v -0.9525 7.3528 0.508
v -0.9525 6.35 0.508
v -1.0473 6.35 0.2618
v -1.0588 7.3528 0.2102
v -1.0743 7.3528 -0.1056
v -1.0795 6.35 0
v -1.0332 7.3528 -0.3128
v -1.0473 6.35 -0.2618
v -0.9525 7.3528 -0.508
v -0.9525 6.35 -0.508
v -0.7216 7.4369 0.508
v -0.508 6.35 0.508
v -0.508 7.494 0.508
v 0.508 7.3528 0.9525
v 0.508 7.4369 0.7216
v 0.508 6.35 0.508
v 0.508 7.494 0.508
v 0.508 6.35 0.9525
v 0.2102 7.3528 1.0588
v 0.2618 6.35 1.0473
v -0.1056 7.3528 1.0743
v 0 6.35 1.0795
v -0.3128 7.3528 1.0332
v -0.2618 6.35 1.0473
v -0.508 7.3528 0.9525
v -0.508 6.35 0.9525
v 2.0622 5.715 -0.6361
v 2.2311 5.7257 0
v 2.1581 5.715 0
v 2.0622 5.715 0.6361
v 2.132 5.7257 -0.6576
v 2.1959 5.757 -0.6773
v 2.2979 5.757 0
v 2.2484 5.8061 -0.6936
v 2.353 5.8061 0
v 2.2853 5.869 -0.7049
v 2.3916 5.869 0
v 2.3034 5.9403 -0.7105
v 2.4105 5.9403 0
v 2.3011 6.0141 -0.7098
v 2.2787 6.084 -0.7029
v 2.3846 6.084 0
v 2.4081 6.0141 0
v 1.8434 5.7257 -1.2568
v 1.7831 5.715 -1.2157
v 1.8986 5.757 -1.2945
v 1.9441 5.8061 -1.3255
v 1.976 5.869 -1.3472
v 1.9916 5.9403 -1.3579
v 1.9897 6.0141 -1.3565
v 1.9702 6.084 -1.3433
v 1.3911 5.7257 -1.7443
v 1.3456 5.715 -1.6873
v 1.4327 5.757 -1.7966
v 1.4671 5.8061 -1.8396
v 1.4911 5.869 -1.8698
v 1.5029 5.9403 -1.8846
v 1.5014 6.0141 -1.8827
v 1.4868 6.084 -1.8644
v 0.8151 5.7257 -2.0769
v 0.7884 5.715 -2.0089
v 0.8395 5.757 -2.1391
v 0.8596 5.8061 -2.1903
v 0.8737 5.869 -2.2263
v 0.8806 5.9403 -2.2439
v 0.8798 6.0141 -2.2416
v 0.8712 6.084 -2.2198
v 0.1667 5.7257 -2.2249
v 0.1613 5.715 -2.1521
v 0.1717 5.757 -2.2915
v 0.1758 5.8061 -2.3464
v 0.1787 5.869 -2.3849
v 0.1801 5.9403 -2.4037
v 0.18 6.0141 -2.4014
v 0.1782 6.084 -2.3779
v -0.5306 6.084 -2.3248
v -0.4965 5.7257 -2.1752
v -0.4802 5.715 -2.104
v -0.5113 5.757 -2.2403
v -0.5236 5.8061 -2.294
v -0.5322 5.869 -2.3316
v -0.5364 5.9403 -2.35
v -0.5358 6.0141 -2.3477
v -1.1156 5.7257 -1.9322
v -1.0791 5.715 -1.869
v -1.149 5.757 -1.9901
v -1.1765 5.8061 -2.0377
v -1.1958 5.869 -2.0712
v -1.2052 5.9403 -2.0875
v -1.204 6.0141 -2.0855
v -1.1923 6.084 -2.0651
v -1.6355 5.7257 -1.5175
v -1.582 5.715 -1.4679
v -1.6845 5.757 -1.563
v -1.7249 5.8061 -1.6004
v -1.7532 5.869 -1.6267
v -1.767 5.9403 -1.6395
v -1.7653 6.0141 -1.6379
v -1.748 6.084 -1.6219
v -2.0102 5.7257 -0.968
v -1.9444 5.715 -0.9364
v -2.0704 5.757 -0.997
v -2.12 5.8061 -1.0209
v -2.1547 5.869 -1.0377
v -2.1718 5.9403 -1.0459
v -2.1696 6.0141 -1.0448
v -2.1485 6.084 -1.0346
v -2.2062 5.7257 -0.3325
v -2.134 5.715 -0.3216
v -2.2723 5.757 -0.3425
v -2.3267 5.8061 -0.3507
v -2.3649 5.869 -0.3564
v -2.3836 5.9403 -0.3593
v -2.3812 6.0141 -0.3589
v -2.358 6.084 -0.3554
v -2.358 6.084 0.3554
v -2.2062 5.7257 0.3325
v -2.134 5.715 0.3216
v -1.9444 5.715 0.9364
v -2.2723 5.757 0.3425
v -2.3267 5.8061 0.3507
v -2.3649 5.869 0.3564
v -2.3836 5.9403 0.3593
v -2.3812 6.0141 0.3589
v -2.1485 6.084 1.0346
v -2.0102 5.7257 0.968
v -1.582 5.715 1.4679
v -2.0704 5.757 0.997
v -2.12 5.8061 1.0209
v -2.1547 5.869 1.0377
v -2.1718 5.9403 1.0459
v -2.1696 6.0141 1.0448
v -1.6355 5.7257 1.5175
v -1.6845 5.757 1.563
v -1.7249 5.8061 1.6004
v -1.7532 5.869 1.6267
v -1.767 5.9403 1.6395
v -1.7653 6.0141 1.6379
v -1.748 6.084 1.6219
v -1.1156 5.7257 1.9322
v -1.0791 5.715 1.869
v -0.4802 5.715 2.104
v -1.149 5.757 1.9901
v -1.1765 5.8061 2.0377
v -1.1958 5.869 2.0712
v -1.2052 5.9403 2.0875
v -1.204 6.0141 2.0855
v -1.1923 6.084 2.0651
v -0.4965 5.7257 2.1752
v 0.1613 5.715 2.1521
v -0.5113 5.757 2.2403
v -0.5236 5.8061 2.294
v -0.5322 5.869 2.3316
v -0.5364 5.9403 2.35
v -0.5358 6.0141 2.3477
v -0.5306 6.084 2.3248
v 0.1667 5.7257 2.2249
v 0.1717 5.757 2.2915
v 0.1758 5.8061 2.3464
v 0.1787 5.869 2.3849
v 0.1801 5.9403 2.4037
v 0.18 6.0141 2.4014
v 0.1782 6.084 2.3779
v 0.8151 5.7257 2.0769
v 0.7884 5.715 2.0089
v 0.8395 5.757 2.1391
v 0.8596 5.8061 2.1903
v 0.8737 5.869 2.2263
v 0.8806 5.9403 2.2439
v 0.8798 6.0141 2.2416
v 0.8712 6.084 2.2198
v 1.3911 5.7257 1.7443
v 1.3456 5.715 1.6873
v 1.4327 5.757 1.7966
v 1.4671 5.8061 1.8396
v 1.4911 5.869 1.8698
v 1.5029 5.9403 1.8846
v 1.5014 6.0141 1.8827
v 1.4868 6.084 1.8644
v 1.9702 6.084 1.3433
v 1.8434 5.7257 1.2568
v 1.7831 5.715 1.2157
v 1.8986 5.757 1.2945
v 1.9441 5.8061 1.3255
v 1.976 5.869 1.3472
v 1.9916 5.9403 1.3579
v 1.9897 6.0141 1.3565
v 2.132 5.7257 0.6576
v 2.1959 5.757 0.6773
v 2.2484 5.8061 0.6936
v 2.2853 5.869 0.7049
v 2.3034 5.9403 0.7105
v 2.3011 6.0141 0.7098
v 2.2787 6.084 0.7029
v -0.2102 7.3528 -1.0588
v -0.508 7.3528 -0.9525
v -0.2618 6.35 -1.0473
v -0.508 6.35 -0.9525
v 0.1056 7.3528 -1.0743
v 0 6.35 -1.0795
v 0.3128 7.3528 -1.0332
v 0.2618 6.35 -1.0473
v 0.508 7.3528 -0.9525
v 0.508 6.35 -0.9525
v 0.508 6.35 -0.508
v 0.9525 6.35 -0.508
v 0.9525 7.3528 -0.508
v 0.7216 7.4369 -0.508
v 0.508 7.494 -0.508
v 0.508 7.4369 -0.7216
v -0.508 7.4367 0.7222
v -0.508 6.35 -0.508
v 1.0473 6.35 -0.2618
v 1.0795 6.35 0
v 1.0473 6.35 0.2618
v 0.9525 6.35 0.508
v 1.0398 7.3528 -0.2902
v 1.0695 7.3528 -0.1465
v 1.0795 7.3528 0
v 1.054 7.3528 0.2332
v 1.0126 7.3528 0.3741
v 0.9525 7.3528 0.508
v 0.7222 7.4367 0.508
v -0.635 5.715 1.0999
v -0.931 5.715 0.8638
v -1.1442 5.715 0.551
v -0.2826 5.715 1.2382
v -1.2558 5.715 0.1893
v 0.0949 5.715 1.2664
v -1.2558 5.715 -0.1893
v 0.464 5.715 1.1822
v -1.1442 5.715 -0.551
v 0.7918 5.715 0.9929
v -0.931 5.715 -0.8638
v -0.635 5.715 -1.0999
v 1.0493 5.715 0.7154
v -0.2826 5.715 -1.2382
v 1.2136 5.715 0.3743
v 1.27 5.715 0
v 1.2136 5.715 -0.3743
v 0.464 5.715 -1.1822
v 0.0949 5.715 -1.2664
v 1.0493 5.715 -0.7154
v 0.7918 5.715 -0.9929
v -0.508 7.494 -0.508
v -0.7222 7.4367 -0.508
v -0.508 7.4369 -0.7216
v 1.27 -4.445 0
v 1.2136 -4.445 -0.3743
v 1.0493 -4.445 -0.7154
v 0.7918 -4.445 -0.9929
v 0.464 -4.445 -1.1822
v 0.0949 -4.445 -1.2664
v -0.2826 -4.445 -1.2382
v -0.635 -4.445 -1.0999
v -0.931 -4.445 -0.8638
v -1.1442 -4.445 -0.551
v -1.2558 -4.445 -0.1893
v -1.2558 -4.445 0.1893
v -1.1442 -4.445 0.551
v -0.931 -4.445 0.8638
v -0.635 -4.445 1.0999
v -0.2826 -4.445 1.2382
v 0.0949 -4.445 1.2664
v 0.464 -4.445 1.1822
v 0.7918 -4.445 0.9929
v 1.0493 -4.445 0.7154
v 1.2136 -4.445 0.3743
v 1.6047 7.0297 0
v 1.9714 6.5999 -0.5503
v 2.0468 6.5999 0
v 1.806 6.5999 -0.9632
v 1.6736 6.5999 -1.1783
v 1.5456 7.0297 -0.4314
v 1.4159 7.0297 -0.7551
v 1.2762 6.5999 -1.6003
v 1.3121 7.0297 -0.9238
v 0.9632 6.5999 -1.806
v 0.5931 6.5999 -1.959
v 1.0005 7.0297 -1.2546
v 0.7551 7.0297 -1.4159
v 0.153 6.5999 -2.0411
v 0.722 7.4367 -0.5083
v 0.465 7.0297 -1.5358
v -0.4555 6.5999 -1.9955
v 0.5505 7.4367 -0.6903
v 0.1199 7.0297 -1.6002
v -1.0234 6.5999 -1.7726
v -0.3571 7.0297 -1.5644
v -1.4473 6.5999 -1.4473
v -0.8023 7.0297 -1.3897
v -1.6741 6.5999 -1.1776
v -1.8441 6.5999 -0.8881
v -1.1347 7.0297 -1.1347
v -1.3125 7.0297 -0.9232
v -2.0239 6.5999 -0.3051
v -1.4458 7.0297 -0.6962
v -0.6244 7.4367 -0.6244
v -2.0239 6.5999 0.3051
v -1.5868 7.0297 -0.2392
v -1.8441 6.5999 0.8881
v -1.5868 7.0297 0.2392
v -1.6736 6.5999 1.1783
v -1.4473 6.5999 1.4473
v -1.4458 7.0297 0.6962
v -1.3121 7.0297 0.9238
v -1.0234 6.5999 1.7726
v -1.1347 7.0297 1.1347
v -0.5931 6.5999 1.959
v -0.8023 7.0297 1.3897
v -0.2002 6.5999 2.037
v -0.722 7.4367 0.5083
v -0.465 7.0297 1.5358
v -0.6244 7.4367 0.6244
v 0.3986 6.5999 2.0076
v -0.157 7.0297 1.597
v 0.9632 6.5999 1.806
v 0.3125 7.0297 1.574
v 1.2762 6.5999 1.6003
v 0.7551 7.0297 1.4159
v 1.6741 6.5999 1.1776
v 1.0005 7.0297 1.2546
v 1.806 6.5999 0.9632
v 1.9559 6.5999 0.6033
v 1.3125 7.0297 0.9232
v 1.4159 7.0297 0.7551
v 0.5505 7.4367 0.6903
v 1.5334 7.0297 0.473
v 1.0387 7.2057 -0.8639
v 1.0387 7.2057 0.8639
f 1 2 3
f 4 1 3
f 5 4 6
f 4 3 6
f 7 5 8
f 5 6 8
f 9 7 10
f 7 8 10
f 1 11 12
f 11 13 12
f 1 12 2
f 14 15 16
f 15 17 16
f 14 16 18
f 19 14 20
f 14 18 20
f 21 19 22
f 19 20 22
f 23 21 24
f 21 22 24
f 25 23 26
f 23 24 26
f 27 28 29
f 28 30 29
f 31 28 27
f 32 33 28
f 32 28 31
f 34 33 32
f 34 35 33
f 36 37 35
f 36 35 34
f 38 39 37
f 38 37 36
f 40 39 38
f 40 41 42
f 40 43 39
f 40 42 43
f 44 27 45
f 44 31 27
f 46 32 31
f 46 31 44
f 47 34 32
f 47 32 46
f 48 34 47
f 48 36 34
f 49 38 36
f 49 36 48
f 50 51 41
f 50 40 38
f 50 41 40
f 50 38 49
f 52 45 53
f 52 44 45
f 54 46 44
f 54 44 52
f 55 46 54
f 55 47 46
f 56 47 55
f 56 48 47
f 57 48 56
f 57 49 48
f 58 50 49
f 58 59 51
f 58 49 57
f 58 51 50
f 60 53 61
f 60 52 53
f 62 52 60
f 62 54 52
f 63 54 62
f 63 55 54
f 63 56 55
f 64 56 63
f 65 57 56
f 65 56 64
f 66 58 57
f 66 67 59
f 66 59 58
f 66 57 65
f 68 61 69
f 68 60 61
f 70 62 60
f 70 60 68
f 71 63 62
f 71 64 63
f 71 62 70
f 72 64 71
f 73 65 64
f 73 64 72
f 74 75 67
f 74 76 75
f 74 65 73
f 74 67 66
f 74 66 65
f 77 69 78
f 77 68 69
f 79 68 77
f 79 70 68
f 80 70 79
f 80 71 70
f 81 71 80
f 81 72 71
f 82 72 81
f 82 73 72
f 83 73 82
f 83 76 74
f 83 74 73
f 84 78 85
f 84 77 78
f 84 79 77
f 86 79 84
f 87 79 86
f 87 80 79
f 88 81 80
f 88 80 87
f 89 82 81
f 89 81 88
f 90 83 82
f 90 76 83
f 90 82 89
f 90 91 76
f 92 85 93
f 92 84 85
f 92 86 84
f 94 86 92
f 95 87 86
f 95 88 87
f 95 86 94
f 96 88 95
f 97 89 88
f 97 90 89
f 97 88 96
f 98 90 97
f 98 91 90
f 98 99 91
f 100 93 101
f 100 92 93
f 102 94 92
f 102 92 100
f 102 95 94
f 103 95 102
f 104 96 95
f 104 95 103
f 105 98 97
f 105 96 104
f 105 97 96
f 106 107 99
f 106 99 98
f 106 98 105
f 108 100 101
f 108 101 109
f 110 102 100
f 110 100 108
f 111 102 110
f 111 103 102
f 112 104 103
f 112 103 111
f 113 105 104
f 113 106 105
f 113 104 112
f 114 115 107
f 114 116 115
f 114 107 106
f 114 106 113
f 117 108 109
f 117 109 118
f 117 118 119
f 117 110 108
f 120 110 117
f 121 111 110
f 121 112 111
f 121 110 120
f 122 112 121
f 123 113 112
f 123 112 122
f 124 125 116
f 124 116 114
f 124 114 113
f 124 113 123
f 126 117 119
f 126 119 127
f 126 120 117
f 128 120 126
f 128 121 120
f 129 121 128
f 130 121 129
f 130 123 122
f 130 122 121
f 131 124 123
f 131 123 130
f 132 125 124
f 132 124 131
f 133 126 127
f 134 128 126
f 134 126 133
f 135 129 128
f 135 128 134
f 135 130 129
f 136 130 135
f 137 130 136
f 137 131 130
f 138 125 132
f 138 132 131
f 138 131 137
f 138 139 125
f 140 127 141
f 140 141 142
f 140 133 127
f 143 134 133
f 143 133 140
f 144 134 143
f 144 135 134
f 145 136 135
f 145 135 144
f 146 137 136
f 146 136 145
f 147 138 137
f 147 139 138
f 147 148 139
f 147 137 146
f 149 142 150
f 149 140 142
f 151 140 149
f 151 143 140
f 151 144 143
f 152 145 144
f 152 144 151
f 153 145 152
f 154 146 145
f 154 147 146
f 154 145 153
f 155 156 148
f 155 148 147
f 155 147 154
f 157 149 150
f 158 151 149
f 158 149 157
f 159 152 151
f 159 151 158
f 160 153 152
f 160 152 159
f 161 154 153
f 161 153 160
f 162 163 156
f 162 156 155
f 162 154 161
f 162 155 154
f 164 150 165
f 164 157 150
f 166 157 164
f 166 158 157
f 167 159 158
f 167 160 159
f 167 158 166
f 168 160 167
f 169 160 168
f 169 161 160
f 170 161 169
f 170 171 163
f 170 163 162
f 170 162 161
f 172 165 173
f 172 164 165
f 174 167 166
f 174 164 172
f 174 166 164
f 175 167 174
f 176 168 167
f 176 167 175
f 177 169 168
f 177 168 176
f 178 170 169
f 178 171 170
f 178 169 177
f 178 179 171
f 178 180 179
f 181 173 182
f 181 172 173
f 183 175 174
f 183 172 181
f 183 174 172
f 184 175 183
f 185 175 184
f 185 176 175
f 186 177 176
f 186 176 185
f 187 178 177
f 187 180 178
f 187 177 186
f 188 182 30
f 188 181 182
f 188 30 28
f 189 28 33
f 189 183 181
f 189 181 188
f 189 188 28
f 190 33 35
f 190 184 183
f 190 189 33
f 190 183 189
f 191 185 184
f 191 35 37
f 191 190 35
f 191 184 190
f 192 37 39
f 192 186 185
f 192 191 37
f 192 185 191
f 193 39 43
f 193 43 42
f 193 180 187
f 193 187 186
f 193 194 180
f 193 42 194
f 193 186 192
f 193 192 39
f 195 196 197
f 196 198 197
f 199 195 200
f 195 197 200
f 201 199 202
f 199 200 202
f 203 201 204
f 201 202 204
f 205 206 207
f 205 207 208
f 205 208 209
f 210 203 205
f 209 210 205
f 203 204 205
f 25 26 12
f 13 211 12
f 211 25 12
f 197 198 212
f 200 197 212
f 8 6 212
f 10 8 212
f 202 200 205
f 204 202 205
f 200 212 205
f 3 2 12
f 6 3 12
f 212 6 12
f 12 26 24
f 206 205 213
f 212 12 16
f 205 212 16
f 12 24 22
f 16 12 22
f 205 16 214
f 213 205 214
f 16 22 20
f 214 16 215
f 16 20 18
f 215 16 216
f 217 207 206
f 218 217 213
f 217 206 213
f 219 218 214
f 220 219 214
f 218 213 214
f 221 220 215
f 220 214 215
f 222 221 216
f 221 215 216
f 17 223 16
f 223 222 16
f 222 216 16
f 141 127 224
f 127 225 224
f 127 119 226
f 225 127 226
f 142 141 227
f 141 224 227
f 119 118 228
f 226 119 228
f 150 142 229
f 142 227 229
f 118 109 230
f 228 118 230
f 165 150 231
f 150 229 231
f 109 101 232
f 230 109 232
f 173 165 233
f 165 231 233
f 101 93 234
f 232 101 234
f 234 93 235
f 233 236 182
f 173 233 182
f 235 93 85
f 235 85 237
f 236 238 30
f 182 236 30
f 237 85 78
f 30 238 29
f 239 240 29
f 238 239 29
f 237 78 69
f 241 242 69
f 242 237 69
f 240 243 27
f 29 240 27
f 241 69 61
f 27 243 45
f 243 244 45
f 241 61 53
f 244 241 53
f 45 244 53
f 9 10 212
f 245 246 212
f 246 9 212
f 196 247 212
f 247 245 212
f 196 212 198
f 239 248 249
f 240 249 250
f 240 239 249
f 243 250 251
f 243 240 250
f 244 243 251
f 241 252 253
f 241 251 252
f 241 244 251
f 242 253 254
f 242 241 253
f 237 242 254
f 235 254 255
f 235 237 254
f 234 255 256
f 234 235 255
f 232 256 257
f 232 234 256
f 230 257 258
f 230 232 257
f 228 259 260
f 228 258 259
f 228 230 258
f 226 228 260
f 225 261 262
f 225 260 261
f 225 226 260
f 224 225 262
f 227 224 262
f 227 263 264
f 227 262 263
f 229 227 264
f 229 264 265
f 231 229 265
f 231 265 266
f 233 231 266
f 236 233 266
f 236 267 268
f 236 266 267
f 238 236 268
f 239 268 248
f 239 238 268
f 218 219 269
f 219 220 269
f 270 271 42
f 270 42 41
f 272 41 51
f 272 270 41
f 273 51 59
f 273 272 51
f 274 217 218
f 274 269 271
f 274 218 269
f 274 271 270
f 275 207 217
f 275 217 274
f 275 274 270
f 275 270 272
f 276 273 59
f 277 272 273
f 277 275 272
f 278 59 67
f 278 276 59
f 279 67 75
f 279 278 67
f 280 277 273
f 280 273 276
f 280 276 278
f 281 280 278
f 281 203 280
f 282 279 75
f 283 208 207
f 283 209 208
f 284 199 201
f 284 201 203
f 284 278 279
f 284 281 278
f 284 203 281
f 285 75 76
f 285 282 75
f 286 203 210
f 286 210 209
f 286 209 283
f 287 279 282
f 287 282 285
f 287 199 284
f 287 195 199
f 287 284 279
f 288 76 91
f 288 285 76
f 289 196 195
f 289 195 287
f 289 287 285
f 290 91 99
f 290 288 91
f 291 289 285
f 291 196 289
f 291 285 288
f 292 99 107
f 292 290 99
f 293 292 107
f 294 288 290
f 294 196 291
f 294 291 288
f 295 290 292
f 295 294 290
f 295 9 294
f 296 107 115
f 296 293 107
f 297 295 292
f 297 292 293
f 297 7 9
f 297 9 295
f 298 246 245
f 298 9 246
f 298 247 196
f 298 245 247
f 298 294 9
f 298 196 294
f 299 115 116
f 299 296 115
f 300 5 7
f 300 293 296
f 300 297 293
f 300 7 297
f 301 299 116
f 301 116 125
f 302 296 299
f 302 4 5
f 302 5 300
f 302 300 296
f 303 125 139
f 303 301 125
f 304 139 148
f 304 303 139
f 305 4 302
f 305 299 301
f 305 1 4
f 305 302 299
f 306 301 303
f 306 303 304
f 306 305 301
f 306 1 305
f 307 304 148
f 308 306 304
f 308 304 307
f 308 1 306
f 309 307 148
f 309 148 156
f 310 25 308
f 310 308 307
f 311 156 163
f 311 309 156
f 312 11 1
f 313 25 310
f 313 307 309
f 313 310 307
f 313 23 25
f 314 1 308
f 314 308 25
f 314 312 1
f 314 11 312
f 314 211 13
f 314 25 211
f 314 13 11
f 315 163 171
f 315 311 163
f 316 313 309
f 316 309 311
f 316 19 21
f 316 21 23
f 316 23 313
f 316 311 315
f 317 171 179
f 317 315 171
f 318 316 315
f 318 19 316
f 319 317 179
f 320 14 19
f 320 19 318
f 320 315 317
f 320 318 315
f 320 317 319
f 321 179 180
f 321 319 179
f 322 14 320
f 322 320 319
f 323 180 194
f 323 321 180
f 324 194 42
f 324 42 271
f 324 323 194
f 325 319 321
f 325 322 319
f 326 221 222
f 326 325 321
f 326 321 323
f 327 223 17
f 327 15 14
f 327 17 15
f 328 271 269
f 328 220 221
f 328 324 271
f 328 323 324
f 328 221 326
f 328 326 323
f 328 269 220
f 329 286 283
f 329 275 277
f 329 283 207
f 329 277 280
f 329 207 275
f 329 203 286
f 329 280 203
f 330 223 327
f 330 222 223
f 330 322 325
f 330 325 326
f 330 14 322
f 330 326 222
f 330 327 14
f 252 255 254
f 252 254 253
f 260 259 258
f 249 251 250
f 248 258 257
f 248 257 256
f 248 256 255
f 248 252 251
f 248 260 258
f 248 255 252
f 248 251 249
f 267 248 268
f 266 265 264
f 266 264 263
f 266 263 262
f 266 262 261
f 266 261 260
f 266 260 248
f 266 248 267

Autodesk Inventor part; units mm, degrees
ref_plane "YZ Plane" through (0, 0, 0) normal (1, 0, 0) x (0, 1, 0)
ref_plane "XZ Plane" through (0, 0, 0) normal (0, 1, 0) x (-1, 0, 0)
ref_plane "XY Plane" through (0, 0, 0) normal (0, 0, 1) x (1, 0, 0)
sketch "Sketch1" plane through (0, 0, 0) normal (0, 0, 1) x (1, 0, 0)
  line L0 (2.1581, 5.715) -> (1.27, 5.715)
  line L1 (1.27, 5.715) -> (1.27, 0)
  line L2 (1.27, 0) -> (0, 0)
  line L3 (0, 0) -> (0, 7.62)
  arc A0 (2.3846, 6.084) -> (0, 7.62) centre (-0.1226, 4.8107) ccw
  arc A1 (2.1581, 5.715) -> (2.3846, 6.084) centre (2.1581, 5.969) ccw
  point P0 (2.54, 5.715)
  dimension "d0" = 7.62
  dimension "d1" = 2.54
  dimension "d2" = 1.905
  dimension "d3" = 1.27
  dimension "d4" = 0.254
revolve "Revolution1" add sketch "Sketch1" angle 360 about axis through (0, 0, 0) along (0, 1, 0)
sketch "Sketch2" plane through (0, 0, 0) normal (0, -1, 0) x (1, 0, 0)
  circle A0 centre (0, 0) radius 1.27 projected
  line L0 (0.9525, 0.508) -> (0.508, 0.508)
  line L1 (0.508, 0.508) -> (0.508, 0.9525)
  line L2 (-0.508, 0.9525) -> (-0.508, 0.508)
  line L3 (-0.508, 0.508) -> (-0.9525, 0.508)
  line L4 (-0.9525, -0.508) -> (-0.508, -0.508)
  line L5 (-0.508, -0.508) -> (-0.508, -0.9525)
  line L6 (0.508, -0.9525) -> (0.508, -0.508)
  line L7 (0.9525, -0.508) -> (0.508, -0.508)
  arc A1 (0.9525, -0.508) -> (0.9525, 0.508) centre (0, 0) ccw
  arc A2 (-0.508, -0.9525) -> (0.508, -0.9525) centre (0, 0) ccw
  arc A3 (0.508, 0.9525) -> (-0.508, 0.9525) centre (0, 0) ccw
  arc A4 (-0.9525, 0.508) -> (-0.9525, -0.508) centre (0, 0) ccw
  point P0 (1.164, -0.508)
  point P1 (1.164, 0.508)
  point P2 (-1.164, -0.508)
  point P3 (-1.164, 0.508)
  point P4 (0.508, -1.164)
  point P5 (-0.508, -1.164)
  point P6 (-0.508, 1.164)
  point P7 (0.508, 1.164)
  dimension "d6" = 0.508
  dimension "d7" = 0.508
extrude "Extrusion1" cut sketch "Sketch2" against normal blind 25.4 contours A1 L7 L6 A2 L5 L4 A4 L3 L2 A3 L1 L0
sketch "Sketch3" plane through (0, 0, 0) normal (0, -1, 0) x (1, 0, 0)
  circle A0 centre (0, 0) radius 1.27
extrude "Extrusion2" add sketch "Sketch3" against normal blind 6.35
sketch "Sketch4" plane through (0, 0, 0) normal (0, -1, 0) x (1, 0, 0)
  circle A0 centre (0, 0) radius 1.27
extrude "Extrusion3" add sketch "Sketch4" along normal blind 4.445
properties part number "Screw"
